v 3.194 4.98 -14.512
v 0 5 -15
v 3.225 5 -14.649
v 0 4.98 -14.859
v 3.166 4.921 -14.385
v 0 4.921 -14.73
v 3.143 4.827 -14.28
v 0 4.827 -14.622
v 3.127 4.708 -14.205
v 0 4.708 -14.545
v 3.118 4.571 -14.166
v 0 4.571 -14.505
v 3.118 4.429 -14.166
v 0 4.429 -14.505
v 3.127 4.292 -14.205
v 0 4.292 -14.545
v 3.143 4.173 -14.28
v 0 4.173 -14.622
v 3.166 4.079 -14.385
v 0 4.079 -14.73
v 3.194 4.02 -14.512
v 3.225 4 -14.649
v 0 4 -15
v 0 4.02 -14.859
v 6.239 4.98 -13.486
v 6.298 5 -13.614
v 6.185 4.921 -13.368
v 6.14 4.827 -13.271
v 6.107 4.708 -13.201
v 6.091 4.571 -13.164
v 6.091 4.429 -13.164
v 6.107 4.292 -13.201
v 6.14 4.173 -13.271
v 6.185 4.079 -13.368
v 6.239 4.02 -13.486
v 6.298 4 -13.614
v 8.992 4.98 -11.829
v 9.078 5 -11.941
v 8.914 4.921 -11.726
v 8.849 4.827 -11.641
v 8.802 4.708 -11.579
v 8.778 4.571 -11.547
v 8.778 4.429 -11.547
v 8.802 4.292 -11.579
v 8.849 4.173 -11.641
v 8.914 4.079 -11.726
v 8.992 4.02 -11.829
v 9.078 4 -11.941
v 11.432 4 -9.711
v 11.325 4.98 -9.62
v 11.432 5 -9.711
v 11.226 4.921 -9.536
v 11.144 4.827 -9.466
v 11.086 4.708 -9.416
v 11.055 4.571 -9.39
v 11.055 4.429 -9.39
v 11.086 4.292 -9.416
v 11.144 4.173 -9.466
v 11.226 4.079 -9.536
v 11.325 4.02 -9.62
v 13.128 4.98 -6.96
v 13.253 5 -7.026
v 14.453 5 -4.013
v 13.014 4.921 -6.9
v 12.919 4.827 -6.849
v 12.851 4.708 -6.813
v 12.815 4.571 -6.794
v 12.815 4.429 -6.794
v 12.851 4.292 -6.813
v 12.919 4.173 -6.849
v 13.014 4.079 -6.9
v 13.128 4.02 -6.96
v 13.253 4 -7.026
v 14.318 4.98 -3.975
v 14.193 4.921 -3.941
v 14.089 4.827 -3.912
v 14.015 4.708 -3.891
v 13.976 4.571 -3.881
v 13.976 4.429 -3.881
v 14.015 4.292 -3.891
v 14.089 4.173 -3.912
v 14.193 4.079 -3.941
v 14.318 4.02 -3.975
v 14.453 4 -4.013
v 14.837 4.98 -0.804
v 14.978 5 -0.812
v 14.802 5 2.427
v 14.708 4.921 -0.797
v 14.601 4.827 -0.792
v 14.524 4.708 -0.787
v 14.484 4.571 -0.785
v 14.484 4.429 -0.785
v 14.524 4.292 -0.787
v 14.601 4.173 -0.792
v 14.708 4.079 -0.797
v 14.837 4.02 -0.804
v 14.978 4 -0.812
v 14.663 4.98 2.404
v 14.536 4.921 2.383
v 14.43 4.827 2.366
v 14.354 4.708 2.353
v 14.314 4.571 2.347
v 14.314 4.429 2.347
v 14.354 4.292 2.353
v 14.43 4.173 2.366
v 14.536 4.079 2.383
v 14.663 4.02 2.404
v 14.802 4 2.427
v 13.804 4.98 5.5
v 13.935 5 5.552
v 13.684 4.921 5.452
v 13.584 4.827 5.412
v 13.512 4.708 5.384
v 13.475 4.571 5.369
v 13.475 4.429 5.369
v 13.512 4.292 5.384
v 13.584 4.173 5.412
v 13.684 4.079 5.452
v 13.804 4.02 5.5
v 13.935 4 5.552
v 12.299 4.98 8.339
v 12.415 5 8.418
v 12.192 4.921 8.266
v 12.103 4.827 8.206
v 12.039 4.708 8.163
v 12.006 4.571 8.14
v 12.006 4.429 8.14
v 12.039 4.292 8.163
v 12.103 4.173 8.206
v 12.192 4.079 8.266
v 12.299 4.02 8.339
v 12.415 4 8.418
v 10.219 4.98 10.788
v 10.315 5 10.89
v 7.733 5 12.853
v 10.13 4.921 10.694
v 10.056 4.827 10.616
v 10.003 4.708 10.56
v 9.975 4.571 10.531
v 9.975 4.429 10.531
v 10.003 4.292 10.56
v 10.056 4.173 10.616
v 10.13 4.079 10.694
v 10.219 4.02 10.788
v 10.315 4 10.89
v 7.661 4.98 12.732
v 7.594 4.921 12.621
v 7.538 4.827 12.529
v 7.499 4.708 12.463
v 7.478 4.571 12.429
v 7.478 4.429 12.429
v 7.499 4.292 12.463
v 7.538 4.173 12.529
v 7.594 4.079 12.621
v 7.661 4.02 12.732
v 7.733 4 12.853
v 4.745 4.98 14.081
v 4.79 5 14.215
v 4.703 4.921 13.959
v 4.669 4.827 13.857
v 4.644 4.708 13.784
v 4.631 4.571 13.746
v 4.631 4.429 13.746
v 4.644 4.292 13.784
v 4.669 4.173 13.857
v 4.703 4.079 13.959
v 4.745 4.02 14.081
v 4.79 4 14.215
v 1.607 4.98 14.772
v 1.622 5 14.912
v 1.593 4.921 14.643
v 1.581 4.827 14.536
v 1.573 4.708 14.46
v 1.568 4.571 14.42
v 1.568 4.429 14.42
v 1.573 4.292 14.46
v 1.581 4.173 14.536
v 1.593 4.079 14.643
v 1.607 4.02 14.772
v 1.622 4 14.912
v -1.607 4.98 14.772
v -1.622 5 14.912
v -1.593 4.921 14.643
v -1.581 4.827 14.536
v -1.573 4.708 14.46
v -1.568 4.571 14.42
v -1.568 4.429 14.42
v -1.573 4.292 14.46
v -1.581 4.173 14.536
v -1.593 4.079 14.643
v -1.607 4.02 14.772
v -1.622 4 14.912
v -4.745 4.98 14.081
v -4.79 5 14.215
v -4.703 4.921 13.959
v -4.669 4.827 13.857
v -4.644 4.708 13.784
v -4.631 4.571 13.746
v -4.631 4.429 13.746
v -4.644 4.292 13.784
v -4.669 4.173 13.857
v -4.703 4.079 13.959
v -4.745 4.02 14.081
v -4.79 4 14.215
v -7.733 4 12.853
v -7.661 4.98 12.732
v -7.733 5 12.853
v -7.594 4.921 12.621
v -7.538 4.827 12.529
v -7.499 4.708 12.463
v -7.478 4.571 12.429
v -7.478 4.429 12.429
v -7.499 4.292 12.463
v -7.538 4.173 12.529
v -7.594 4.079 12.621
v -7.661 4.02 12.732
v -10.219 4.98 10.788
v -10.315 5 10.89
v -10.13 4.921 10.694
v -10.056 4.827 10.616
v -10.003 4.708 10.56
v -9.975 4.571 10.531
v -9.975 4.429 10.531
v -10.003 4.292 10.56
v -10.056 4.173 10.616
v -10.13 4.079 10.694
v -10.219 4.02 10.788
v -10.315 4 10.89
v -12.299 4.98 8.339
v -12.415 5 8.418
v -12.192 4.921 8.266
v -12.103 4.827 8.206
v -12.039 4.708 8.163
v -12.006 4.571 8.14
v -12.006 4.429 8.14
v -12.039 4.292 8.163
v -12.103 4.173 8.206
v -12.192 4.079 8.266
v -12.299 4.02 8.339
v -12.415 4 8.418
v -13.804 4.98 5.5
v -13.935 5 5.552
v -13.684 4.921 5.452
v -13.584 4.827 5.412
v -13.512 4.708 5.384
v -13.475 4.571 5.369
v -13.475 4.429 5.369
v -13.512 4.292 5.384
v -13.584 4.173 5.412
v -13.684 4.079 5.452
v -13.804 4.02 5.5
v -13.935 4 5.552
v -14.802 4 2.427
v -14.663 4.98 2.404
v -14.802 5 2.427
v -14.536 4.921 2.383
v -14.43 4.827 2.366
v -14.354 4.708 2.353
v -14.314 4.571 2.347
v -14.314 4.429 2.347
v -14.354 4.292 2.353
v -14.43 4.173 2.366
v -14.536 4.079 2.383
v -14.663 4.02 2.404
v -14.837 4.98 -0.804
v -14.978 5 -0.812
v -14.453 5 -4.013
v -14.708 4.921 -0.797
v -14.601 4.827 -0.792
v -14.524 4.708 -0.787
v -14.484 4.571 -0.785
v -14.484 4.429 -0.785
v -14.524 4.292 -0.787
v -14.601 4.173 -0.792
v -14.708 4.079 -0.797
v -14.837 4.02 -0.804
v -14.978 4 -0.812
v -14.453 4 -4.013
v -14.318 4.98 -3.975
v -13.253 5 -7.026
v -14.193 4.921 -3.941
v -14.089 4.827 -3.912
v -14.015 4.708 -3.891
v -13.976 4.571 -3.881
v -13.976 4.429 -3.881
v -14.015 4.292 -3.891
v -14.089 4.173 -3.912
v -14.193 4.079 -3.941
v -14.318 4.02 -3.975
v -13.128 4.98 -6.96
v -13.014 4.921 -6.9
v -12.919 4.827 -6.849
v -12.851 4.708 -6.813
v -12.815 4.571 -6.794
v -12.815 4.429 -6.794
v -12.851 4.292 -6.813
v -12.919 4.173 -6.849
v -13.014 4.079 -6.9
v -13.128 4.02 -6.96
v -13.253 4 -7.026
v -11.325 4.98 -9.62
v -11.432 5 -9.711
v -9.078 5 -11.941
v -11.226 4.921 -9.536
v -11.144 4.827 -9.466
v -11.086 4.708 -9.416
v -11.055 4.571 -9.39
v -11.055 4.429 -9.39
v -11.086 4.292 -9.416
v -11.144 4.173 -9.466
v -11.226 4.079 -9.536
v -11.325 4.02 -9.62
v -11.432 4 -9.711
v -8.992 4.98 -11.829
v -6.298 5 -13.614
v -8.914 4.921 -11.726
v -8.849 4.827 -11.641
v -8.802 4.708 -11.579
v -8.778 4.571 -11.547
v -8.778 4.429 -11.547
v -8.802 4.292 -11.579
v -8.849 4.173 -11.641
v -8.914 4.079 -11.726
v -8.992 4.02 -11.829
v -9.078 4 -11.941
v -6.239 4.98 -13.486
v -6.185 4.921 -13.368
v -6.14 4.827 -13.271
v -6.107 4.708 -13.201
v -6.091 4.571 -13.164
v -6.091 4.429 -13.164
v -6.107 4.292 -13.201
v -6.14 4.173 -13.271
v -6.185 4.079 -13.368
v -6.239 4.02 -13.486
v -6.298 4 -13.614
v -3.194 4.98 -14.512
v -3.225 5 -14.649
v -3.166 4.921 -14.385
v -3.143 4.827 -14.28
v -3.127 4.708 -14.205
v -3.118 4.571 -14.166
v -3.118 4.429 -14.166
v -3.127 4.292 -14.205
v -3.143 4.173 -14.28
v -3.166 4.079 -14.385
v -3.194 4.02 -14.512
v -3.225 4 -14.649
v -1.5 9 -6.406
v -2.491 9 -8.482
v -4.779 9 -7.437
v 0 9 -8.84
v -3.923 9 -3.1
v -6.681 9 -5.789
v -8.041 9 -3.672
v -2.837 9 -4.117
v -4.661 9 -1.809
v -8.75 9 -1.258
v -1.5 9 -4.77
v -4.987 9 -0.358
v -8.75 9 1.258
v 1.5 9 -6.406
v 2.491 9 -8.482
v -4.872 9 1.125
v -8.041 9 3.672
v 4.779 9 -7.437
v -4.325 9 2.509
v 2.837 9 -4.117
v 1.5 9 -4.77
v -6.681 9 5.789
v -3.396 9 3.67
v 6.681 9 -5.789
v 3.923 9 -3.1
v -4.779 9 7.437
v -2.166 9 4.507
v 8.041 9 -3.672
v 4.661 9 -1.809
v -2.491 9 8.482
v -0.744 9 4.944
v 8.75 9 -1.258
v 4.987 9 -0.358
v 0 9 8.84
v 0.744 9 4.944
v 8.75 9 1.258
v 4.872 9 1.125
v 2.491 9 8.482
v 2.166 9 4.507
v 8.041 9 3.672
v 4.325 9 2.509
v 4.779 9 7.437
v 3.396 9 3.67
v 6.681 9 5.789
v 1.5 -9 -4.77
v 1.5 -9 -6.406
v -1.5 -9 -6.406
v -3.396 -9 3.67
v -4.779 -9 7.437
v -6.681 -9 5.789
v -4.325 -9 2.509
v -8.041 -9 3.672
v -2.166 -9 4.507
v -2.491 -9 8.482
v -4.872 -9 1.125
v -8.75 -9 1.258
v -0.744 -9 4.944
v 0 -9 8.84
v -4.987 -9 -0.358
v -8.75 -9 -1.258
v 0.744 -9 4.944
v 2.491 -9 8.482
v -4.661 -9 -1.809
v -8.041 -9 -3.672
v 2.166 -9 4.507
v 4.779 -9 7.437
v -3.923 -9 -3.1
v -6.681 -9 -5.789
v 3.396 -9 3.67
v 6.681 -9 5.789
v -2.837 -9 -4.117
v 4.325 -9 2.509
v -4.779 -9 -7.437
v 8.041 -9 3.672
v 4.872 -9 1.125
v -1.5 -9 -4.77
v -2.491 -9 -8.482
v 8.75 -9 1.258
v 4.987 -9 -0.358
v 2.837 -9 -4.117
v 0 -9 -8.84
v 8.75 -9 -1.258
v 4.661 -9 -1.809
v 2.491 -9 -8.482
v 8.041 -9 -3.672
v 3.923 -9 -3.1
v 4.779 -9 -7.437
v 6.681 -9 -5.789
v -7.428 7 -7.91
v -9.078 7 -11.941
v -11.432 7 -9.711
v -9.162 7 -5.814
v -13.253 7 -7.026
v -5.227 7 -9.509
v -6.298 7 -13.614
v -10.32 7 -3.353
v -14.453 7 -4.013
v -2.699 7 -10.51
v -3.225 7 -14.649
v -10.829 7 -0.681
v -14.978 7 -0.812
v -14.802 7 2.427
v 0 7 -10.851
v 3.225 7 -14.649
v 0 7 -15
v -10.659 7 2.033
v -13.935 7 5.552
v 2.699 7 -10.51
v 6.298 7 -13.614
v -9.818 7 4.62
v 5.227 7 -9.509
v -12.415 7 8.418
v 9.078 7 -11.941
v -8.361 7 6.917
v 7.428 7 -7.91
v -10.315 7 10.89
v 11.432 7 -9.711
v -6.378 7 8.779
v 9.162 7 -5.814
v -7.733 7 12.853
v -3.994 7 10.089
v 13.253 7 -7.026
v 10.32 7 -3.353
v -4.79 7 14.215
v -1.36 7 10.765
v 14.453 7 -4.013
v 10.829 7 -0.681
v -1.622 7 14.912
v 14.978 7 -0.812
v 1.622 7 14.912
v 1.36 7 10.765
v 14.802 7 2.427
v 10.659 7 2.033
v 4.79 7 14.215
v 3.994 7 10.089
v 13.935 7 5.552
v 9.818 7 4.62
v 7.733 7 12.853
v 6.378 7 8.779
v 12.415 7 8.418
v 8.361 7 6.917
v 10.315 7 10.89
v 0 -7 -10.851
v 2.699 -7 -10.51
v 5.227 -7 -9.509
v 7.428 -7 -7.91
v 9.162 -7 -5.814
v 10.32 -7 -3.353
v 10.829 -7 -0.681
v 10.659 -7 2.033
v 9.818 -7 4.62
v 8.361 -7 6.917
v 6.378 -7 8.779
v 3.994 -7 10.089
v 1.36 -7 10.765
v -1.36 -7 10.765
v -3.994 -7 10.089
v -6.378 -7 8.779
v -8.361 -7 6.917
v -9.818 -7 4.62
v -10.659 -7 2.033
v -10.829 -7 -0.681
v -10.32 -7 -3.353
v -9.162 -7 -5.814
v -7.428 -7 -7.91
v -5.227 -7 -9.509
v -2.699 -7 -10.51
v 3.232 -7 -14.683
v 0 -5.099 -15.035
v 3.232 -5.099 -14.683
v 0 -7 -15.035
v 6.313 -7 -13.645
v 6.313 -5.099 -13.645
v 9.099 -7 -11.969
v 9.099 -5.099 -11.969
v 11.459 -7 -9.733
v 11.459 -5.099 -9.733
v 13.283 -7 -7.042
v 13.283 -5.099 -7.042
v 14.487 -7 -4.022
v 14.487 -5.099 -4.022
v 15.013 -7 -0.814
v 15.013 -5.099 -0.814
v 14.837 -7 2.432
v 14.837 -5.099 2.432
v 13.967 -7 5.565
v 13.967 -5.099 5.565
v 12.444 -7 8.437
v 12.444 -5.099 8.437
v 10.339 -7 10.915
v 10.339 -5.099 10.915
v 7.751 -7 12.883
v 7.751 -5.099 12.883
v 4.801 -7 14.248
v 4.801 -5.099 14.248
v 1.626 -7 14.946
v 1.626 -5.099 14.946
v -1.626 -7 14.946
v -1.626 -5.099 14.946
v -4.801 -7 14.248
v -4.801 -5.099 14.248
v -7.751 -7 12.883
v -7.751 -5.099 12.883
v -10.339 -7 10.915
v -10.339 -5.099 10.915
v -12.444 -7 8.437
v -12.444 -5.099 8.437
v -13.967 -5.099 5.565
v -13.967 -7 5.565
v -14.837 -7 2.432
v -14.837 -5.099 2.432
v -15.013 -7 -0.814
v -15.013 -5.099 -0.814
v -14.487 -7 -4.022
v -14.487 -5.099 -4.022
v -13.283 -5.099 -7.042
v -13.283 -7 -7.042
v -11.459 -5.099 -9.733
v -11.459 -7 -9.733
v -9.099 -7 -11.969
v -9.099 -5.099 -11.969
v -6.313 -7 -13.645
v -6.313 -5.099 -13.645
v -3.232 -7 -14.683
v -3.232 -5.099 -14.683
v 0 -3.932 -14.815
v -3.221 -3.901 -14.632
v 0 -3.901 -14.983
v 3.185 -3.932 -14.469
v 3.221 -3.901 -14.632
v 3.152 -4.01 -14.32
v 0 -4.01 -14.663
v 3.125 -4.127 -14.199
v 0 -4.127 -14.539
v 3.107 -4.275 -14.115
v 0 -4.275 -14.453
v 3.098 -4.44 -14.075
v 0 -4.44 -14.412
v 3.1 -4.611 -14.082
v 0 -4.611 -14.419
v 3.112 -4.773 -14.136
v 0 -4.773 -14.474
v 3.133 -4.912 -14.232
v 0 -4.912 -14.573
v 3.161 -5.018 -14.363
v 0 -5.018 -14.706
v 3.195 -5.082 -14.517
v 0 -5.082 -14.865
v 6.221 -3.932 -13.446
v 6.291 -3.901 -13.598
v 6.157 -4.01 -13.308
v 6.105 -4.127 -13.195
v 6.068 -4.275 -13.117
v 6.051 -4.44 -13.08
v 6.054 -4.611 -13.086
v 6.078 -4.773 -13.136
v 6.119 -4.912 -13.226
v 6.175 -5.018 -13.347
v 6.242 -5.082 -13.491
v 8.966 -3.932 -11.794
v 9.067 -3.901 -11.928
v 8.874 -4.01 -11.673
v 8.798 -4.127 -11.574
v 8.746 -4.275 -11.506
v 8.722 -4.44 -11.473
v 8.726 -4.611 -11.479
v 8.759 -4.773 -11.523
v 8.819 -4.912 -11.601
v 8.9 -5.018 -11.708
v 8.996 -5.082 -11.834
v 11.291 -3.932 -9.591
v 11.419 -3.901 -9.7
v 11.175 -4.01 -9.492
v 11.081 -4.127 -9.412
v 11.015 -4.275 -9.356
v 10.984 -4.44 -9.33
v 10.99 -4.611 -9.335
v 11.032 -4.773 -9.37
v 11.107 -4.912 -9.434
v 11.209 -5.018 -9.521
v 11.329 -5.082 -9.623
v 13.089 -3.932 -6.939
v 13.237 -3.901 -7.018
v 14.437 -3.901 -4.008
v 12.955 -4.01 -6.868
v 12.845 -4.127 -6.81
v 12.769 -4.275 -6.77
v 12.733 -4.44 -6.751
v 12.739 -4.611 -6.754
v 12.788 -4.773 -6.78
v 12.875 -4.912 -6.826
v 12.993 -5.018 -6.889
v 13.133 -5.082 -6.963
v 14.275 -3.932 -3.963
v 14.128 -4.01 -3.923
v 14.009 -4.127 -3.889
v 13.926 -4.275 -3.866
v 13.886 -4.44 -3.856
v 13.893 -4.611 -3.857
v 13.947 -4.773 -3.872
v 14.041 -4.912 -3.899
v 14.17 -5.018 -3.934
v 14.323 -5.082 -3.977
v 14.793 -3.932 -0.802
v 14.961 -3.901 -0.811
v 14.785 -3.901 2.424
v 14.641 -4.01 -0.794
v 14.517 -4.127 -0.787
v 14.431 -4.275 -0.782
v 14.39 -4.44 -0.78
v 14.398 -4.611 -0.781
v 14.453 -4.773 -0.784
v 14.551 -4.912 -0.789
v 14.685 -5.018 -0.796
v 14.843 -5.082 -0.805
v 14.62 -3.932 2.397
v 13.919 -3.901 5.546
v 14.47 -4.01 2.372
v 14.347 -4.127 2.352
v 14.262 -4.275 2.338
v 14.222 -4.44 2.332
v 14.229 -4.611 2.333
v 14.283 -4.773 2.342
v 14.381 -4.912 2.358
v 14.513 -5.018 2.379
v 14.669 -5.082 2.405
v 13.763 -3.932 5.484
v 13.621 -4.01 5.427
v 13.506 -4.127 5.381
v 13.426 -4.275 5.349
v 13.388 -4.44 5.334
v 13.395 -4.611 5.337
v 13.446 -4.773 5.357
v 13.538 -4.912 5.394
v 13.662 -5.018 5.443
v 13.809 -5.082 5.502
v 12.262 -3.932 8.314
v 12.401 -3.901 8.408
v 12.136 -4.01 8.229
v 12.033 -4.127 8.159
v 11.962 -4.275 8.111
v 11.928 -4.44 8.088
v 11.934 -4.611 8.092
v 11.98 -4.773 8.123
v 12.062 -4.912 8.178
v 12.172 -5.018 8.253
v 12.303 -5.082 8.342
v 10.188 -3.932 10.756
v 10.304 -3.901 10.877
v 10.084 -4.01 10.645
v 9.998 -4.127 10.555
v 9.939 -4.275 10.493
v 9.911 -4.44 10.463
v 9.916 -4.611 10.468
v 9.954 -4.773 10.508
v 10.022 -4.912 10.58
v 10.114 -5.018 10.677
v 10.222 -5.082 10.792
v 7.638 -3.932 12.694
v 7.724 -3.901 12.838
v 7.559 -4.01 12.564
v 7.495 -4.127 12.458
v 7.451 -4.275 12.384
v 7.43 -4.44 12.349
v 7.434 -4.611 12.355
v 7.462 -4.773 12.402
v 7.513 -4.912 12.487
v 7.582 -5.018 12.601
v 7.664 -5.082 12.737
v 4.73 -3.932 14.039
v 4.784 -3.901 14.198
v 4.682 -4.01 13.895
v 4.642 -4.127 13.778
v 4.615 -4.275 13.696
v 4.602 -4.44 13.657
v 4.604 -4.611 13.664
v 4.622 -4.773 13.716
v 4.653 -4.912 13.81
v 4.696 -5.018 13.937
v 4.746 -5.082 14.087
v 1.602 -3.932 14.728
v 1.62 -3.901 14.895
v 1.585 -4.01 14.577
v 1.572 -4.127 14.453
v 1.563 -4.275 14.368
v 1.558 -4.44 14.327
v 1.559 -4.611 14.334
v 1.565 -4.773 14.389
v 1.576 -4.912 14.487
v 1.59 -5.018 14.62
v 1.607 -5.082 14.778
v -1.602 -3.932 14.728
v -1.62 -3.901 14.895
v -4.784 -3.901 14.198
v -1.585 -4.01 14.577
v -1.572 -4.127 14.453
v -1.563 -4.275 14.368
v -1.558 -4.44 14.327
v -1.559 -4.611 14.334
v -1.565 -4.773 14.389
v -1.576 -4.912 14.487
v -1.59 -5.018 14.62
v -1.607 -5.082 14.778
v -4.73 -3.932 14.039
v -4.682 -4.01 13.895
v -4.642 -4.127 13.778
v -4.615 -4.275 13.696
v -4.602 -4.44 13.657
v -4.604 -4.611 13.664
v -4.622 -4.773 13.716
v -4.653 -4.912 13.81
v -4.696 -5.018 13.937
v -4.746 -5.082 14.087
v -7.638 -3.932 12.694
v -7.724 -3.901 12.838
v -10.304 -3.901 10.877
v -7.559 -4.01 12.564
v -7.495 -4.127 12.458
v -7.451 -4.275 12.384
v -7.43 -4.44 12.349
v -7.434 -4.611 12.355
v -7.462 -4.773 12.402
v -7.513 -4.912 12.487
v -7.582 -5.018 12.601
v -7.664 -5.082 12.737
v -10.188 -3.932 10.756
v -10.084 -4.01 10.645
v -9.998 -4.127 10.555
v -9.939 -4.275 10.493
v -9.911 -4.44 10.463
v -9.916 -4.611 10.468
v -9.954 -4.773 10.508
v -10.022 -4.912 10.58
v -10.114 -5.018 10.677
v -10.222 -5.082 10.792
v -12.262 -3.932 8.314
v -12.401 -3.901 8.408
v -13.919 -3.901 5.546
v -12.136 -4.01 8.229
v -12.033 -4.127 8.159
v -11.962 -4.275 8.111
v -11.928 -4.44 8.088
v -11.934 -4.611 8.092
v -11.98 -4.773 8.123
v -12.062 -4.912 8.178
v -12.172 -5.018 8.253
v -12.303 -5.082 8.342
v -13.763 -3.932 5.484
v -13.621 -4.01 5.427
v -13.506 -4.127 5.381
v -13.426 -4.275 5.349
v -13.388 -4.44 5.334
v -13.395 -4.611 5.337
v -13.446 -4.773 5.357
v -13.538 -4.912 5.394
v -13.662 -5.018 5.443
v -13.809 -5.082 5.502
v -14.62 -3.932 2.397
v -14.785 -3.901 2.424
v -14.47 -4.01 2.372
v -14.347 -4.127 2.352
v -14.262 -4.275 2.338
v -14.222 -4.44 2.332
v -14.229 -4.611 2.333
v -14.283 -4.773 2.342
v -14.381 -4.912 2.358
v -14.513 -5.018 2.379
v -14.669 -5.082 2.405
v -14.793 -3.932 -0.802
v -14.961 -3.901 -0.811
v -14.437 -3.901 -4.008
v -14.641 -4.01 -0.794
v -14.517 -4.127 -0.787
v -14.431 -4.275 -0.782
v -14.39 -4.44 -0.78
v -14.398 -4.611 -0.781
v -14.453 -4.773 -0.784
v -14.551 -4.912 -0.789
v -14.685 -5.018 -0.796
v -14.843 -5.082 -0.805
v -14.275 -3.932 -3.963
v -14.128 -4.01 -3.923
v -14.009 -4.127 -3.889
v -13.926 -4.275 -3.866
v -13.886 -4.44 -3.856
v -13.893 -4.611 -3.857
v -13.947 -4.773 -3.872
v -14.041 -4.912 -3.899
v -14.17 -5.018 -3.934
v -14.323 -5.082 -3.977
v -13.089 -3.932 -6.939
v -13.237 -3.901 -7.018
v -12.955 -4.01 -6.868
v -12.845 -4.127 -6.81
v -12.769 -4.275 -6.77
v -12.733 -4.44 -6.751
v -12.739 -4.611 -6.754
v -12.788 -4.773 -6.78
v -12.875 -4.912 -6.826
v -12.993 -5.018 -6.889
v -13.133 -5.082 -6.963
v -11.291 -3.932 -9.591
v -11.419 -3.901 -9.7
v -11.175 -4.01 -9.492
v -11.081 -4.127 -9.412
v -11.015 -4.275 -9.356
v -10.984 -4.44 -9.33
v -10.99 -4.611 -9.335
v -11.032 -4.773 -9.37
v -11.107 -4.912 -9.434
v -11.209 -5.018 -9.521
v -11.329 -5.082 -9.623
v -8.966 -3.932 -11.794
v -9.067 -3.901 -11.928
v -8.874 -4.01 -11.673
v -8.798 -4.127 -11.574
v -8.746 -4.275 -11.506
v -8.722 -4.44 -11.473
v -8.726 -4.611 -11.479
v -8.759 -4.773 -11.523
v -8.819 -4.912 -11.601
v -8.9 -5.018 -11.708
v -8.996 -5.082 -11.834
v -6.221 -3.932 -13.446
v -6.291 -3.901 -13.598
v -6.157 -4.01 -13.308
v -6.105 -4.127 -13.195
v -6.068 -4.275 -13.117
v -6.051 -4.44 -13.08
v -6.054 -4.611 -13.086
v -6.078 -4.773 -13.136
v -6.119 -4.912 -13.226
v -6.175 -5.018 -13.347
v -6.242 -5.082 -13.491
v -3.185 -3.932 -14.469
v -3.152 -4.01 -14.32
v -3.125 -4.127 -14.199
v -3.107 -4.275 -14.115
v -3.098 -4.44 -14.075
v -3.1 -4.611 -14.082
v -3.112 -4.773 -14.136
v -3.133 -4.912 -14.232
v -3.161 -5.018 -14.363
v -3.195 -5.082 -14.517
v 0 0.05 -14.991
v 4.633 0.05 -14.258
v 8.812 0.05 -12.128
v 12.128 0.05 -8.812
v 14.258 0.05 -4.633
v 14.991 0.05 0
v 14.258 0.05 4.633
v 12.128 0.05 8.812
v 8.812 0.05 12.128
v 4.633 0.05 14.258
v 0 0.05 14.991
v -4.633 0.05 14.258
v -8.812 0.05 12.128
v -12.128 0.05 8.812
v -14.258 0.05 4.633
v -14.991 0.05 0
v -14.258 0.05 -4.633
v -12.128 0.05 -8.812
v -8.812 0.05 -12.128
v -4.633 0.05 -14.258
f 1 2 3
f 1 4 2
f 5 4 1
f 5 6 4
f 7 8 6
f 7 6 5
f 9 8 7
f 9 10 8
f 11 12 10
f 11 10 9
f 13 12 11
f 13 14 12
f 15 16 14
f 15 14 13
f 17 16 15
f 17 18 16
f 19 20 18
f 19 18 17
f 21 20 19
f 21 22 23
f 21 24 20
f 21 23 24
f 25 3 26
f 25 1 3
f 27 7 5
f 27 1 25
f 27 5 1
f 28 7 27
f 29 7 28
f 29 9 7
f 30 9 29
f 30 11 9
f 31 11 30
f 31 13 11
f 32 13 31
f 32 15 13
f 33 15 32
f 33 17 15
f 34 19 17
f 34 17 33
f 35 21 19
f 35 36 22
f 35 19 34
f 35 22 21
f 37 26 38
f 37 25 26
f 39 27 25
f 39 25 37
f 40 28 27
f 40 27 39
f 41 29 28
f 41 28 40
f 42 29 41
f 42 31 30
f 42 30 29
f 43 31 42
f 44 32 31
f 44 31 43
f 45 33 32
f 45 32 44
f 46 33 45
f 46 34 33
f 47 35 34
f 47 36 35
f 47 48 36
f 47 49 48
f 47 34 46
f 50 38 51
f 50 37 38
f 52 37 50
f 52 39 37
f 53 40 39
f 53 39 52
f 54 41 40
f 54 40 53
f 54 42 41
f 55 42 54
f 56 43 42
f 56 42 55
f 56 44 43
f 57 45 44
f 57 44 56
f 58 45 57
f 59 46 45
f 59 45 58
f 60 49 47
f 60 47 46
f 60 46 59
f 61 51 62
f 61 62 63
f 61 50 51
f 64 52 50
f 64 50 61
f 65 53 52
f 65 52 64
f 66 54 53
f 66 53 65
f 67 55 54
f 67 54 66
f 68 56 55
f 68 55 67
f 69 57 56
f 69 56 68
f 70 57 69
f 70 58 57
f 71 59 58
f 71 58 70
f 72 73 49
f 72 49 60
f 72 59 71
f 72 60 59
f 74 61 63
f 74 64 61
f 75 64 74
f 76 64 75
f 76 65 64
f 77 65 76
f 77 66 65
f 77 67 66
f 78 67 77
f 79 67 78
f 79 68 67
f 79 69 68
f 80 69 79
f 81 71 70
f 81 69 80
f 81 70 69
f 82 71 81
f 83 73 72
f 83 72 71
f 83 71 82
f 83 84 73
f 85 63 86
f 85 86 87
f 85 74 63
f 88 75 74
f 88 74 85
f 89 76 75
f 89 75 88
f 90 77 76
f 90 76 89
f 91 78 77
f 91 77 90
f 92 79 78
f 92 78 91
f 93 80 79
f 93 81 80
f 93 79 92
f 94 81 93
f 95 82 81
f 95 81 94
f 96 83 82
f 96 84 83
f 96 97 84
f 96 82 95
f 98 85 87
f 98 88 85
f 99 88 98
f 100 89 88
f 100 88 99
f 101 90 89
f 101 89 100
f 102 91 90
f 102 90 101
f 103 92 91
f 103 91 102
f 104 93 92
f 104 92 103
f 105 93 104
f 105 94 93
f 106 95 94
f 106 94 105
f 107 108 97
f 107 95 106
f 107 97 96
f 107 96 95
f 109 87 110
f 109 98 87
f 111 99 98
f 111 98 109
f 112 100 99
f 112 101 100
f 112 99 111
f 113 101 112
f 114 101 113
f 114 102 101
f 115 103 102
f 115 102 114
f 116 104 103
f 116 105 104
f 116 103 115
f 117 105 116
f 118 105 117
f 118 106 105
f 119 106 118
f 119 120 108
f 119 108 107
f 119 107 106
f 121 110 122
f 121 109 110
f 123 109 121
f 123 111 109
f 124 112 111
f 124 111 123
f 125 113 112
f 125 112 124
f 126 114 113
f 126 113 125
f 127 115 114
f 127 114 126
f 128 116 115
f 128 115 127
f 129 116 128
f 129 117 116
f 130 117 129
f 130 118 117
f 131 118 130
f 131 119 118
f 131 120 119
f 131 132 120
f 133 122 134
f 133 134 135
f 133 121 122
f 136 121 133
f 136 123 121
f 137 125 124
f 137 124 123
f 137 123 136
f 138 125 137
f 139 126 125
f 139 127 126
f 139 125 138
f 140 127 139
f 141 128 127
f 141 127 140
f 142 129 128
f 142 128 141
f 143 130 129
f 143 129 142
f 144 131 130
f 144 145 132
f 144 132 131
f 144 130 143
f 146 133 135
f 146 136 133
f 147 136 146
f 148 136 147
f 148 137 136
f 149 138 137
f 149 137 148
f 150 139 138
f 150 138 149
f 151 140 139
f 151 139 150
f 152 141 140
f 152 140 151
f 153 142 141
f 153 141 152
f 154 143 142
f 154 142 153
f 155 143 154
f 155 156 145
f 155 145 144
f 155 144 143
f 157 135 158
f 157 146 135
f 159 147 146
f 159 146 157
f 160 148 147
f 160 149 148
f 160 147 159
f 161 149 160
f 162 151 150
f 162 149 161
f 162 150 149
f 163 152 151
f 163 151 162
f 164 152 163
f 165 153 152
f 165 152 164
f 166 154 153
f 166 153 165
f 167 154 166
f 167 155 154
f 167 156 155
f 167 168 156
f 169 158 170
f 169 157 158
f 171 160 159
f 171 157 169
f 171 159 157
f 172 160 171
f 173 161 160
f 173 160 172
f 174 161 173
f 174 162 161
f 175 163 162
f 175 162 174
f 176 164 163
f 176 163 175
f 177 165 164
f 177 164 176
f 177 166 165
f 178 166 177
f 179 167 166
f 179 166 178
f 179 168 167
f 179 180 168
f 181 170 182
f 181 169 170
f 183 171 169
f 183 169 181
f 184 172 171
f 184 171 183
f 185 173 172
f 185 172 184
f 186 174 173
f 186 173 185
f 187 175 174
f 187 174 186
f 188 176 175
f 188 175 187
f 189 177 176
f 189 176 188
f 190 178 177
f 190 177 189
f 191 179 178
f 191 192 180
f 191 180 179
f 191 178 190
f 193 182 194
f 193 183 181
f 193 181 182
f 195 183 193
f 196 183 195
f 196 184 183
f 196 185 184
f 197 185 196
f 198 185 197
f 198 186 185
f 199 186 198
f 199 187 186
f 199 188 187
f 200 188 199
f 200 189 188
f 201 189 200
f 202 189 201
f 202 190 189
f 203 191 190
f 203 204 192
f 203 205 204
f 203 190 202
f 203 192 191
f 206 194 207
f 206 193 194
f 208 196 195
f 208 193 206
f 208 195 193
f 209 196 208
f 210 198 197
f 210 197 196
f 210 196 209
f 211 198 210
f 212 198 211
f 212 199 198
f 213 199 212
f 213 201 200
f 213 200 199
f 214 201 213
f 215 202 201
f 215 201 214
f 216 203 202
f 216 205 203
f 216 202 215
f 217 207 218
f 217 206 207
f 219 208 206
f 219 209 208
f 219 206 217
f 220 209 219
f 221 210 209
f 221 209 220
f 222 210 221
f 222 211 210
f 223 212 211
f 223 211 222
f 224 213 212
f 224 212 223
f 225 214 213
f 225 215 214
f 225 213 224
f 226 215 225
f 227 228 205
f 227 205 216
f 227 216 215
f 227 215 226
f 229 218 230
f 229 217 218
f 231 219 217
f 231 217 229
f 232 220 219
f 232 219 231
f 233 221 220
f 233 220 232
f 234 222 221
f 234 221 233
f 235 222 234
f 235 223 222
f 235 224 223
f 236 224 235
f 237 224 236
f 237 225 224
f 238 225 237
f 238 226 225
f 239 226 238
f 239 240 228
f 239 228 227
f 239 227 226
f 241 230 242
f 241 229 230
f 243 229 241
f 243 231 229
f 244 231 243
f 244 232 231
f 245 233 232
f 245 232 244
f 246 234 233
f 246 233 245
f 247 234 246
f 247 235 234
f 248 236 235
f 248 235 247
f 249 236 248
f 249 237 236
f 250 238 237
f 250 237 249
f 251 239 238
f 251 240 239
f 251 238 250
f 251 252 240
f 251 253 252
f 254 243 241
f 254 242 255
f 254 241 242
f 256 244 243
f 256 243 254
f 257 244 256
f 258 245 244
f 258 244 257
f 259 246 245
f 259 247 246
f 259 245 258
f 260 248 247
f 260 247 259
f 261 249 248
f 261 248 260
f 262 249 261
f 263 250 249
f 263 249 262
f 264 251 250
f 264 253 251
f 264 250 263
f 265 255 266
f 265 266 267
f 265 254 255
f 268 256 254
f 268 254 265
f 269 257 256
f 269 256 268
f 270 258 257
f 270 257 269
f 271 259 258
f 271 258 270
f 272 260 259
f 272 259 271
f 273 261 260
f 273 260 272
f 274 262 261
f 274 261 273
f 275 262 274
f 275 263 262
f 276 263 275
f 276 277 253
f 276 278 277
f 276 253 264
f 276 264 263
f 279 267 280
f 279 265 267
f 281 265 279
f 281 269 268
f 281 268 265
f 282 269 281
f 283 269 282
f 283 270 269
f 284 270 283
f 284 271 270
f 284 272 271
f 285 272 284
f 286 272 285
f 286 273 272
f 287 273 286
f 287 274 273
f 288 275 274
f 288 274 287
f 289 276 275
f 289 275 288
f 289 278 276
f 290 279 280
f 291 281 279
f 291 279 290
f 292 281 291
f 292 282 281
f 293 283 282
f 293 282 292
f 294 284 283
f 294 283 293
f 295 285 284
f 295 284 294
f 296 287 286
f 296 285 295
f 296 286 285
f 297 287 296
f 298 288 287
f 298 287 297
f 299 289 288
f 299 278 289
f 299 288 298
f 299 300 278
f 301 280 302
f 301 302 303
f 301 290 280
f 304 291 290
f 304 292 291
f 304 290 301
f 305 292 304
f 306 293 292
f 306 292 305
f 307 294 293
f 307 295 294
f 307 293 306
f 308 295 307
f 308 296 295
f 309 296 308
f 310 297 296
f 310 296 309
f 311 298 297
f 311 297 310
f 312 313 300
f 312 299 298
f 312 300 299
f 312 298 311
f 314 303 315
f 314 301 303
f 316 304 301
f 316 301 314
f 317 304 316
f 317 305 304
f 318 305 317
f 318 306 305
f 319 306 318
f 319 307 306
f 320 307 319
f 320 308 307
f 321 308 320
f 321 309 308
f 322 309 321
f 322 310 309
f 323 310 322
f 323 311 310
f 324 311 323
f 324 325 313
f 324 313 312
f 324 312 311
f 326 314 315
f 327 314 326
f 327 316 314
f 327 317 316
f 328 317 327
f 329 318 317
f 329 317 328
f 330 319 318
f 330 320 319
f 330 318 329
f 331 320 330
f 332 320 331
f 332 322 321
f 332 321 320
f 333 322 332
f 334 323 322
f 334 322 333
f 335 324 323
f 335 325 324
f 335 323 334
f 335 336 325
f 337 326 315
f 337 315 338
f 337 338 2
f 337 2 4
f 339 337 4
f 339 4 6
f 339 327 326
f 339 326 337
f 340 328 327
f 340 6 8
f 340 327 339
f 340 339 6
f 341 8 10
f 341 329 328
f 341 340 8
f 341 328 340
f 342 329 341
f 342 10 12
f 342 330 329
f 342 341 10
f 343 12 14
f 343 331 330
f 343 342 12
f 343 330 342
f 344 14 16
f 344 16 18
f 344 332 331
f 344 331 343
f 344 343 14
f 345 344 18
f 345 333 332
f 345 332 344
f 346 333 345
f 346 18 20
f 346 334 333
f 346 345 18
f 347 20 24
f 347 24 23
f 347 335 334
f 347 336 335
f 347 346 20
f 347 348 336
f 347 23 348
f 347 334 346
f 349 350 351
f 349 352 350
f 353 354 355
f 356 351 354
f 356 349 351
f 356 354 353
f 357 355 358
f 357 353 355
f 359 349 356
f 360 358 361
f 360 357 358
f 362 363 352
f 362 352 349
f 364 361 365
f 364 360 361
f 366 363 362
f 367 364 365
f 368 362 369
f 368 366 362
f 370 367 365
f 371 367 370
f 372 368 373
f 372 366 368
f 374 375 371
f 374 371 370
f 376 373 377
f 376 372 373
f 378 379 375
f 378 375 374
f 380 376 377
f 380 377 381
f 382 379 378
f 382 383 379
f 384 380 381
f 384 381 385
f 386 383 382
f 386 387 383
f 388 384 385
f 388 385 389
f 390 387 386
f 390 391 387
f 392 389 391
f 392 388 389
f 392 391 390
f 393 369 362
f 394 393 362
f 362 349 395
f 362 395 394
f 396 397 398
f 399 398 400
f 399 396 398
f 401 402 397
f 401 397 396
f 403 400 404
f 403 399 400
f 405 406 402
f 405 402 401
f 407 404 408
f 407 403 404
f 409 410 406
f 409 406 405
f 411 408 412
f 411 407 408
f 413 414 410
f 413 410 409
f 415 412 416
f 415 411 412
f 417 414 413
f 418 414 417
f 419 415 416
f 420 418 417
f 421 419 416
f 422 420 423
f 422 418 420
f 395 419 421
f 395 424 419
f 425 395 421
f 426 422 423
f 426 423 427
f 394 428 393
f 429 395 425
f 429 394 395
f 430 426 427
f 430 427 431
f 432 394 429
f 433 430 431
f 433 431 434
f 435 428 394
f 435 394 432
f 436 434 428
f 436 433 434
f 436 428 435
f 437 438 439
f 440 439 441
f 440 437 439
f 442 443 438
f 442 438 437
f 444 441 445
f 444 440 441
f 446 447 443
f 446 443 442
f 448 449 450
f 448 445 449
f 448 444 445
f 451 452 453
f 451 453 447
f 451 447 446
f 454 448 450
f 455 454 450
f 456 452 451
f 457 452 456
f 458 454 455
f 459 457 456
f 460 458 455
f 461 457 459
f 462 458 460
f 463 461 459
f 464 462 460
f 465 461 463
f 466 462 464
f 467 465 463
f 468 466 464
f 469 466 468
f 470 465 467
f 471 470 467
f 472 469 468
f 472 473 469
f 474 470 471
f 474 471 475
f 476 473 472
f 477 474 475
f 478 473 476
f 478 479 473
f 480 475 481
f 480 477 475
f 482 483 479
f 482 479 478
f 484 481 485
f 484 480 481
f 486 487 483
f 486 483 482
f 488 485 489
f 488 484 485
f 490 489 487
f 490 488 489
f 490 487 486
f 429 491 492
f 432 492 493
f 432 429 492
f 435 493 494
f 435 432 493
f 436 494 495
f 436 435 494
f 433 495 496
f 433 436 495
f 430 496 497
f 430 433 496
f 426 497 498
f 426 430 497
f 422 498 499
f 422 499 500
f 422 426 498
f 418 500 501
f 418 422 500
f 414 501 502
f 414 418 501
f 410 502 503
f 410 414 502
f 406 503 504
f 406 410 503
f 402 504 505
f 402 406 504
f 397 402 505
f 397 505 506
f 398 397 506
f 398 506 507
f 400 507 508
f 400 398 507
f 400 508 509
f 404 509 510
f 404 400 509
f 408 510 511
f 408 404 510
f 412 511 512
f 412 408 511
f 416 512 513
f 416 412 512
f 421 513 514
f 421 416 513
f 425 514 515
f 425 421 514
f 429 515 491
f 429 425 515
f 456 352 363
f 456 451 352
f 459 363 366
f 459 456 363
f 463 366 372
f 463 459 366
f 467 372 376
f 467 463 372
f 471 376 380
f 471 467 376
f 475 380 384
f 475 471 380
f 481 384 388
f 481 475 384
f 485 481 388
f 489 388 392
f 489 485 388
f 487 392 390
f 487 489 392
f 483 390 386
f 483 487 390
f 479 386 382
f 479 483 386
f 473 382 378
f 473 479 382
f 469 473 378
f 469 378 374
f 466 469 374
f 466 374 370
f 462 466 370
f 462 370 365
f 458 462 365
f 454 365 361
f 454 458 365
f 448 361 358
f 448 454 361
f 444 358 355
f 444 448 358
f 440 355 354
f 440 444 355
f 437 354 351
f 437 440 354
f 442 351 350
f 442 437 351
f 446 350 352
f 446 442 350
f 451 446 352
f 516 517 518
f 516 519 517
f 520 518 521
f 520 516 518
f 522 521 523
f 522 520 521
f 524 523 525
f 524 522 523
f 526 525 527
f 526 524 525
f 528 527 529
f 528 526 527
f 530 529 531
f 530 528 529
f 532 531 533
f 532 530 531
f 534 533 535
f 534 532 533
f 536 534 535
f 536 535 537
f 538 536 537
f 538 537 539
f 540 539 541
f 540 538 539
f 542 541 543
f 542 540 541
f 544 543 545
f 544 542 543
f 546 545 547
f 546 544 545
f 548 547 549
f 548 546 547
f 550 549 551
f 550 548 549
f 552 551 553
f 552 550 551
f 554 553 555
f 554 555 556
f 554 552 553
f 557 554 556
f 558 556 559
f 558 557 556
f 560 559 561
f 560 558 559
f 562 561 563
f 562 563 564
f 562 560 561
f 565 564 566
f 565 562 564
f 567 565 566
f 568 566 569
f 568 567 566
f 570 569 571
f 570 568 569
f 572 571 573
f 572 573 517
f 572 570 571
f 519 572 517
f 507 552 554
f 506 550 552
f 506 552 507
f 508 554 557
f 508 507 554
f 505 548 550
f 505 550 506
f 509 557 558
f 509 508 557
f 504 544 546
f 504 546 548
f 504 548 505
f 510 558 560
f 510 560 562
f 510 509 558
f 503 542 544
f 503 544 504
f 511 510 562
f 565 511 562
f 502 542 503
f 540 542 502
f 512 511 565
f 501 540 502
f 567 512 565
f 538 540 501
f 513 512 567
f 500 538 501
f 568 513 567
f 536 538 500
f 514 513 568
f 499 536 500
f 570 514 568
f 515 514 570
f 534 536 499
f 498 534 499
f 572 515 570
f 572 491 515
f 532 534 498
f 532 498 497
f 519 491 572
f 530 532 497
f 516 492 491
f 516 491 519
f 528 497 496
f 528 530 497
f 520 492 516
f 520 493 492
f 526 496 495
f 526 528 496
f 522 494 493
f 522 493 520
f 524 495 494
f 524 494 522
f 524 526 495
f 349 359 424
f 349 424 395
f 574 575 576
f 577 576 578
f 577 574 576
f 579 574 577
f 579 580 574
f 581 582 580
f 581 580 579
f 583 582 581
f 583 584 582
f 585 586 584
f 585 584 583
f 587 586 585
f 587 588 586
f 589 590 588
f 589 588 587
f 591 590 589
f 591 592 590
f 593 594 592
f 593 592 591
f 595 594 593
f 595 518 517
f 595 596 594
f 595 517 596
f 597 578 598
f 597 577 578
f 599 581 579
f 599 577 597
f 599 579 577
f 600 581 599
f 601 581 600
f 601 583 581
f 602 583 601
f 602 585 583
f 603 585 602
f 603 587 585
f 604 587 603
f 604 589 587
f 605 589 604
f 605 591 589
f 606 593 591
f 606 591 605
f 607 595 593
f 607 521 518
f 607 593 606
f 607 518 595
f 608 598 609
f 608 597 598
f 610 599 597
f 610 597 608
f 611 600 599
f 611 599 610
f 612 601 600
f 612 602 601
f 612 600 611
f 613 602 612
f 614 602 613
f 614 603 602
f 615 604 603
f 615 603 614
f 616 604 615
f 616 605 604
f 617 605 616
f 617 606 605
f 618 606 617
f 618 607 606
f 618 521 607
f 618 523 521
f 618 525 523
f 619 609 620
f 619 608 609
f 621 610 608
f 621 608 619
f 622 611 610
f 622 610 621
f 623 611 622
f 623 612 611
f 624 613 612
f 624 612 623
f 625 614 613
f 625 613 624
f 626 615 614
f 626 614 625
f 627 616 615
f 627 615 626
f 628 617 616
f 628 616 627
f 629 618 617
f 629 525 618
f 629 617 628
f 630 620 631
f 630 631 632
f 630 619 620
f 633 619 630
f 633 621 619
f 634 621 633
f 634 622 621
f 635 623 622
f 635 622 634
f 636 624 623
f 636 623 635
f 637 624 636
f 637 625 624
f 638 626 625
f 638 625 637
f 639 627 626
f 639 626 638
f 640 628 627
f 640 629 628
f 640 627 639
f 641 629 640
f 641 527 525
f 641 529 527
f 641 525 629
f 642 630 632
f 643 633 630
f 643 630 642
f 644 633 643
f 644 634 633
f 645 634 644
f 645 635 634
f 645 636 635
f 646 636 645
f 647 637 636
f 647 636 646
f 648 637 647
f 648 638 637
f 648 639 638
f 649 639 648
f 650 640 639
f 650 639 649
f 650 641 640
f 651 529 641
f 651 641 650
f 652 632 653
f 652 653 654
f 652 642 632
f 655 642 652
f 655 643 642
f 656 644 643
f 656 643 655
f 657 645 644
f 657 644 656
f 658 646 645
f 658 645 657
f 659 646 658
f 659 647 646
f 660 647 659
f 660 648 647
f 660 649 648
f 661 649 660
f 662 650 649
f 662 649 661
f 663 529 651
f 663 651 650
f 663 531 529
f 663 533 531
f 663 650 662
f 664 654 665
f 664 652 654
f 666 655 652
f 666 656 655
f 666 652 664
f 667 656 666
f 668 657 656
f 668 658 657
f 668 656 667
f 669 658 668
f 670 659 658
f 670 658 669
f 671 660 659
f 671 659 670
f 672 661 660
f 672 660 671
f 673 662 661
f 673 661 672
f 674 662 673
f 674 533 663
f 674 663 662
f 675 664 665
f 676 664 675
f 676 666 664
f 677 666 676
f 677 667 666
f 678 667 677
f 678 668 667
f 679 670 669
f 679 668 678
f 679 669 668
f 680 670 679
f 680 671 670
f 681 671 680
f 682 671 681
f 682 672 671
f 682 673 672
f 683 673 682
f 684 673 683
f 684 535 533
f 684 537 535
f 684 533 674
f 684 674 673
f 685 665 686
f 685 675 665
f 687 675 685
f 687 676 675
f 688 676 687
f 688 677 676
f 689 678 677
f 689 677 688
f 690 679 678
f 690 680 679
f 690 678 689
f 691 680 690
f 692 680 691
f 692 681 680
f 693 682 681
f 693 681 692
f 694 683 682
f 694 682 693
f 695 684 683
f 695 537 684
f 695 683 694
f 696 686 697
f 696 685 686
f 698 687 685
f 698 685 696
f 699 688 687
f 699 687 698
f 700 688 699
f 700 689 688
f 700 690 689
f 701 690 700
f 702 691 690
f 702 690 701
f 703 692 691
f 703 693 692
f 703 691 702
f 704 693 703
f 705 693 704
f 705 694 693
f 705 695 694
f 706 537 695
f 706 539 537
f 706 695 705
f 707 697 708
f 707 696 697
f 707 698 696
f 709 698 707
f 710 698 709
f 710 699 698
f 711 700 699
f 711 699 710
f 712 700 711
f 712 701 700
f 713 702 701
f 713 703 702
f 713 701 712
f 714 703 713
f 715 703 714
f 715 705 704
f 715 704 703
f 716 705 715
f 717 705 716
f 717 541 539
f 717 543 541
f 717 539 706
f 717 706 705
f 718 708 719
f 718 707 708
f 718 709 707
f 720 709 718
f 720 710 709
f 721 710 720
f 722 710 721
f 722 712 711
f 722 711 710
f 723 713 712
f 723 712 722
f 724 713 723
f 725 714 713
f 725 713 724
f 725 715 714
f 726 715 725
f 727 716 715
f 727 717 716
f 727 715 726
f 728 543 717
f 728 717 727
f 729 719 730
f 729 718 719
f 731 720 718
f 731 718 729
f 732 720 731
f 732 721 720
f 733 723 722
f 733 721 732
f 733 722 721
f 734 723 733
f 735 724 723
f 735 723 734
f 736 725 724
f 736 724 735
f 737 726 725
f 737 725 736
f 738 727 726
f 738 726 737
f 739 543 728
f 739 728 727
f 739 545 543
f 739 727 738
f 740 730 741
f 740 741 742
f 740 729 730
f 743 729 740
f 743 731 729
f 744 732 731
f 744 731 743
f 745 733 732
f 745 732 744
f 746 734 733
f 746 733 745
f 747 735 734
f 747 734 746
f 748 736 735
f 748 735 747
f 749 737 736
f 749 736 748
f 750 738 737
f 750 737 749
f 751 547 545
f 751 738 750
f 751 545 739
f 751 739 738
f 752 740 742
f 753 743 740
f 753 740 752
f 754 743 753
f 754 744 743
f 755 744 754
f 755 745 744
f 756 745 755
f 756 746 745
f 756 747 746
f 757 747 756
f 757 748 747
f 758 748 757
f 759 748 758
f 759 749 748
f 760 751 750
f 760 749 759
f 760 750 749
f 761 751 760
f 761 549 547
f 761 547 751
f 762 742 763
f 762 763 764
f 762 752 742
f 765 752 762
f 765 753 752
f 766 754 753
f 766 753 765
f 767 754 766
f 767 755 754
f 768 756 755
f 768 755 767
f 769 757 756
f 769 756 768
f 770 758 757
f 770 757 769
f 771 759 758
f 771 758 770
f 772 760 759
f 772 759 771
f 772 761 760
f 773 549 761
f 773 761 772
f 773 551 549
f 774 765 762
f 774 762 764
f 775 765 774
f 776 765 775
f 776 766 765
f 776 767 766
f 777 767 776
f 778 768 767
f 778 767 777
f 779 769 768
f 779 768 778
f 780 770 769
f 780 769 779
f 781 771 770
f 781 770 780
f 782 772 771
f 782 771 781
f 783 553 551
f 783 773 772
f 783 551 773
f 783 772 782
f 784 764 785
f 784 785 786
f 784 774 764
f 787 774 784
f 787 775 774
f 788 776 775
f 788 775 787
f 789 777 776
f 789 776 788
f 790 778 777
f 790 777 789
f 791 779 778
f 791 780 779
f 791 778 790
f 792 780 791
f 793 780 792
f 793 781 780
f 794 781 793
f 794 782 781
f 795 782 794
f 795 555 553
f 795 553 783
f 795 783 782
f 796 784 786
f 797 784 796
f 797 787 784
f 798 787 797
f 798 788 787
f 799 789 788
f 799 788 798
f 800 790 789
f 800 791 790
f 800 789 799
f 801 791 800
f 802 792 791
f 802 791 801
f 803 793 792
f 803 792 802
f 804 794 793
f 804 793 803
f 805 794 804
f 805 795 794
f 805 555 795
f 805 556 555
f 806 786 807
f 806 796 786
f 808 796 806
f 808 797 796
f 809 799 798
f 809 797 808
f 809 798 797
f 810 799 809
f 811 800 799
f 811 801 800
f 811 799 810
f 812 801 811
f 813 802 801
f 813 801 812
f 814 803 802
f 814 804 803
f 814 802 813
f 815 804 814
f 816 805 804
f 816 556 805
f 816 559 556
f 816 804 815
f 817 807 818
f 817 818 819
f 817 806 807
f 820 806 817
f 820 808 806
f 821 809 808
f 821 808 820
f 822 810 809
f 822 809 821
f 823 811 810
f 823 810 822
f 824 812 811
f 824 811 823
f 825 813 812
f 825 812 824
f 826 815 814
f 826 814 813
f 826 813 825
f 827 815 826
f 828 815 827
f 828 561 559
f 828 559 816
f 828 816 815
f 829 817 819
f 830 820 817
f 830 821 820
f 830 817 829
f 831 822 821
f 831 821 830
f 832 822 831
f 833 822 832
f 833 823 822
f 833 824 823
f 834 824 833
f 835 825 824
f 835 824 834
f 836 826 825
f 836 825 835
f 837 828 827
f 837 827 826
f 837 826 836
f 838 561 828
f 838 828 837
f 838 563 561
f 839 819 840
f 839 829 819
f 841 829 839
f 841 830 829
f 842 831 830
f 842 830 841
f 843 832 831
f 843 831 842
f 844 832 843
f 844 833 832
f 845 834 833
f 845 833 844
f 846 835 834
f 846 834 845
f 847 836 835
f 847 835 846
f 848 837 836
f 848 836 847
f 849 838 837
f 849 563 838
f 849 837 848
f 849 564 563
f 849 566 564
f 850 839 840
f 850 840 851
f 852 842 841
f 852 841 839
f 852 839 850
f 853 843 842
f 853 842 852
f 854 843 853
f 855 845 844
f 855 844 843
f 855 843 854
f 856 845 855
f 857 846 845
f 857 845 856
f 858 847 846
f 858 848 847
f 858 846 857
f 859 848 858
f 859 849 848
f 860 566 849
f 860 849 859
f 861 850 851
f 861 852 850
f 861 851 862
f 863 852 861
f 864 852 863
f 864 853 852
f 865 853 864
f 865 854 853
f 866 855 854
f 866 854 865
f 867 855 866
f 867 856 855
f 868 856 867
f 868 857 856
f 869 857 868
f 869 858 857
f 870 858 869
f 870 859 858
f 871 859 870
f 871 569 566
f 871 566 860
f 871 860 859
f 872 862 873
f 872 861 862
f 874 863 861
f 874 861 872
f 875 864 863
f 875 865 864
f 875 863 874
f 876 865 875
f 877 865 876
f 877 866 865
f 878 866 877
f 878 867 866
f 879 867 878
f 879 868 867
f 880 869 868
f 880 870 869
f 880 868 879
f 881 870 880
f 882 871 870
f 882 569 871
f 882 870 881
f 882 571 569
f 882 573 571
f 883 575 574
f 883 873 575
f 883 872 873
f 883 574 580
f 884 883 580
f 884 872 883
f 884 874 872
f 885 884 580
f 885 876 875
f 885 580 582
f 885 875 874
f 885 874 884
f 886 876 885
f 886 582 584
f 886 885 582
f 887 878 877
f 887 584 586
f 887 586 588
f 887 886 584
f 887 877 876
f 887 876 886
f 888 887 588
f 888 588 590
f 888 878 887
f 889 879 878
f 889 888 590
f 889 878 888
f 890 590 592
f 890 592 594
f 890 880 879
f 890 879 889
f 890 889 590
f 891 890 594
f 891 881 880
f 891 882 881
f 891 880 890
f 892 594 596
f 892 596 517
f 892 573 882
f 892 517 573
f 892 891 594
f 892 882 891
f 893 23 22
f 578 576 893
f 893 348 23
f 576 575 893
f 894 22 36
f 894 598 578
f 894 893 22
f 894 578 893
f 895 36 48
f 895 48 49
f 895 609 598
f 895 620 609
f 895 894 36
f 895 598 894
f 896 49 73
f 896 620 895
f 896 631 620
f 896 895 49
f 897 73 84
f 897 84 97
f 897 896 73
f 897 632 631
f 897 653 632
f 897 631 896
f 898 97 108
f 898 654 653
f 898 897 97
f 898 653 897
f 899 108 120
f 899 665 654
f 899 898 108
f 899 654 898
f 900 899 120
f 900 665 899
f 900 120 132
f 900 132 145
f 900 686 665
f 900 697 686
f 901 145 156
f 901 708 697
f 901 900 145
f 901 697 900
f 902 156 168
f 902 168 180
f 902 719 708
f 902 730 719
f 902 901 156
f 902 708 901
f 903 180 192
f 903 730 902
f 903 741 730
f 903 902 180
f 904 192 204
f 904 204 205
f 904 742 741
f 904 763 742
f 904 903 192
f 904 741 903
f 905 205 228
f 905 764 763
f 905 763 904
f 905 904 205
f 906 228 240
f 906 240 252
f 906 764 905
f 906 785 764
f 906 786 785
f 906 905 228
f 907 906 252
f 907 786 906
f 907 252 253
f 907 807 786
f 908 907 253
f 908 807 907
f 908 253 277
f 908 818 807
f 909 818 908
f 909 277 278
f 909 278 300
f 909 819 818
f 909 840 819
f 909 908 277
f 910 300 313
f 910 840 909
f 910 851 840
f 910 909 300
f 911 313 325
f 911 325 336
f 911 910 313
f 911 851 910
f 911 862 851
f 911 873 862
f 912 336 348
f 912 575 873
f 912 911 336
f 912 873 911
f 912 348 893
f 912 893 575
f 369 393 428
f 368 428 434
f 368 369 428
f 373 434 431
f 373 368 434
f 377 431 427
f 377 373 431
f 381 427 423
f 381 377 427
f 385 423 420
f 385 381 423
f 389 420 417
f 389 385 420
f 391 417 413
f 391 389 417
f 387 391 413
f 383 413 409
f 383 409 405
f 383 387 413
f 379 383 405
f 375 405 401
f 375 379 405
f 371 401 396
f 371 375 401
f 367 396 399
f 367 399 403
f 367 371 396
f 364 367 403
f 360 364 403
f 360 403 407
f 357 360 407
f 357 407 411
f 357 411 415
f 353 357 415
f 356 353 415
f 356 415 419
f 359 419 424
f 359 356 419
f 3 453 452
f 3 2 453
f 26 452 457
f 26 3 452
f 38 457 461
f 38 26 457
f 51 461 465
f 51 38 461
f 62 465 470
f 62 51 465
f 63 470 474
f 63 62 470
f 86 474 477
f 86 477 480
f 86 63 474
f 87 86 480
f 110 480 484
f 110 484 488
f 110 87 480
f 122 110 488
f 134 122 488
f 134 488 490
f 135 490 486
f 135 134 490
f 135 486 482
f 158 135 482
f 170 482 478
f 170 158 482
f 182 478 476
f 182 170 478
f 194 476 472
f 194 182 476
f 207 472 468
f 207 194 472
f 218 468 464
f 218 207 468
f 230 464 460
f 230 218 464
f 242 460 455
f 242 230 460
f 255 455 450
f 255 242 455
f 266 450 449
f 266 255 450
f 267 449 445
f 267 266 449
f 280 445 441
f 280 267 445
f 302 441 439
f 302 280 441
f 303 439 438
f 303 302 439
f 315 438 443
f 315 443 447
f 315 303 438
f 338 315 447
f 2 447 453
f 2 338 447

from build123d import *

# Parameters (mm, degrees)
SKETCH_2_W          = 3
SKETCH_2_H          = 2.405661247
CUT_EXTRUDE_1_DEPTH = 19


with BuildPart() as part:
    # Эскиз1 → Повернуть1 (revolve)
    with BuildSketch(Plane(origin=(0, 0, 0), x_dir=(0, 0, -1), z_dir=(1, 0, 0))):
        with BuildLine():
            Line((15, 7), (15, 5))
            ThreePointArc((15, 5), (14.5, 4.5), (15, 4))
            Line((15, 4), (14.982695469, -3.900561726))
            ThreePointArc((14.982695469, -3.900561726), (14.409213991, -4.525956797), (15.034609063, -5.099438274))
            Line((15.034609063, -5.099438274), (15.034609063, -7))
            Line((15.034609063, -7), (10.850882415, -7))
            Line((10.850882415, -7), (8.840023423, -9))
            Line((8.840023423, -9), (5, -9))
            Line((5, -9), (5, 9))
            Line((5, 9), (8.840023423, 9))
            Line((8.840023423, 9), (10.850882415, 7))
            Line((10.850882415, 7), (15, 7))
        make_face()
    revolve(axis=Axis((0, 26.633173064, 0), (0, -1, 0)))

    # Эскиз2 → Вырез-Вытянуть1 (cut, through all)
    with BuildSketch(Plane(origin=(0, 9, 0), x_dir=(1, 0, 0), z_dir=(0, 1, 0))):
        with Locations((0, 5.202830624)):
            Rectangle(SKETCH_2_W, SKETCH_2_H)
    extrude(amount=-CUT_EXTRUDE_1_DEPTH, mode=Mode.SUBTRACT)


solid = part.part
